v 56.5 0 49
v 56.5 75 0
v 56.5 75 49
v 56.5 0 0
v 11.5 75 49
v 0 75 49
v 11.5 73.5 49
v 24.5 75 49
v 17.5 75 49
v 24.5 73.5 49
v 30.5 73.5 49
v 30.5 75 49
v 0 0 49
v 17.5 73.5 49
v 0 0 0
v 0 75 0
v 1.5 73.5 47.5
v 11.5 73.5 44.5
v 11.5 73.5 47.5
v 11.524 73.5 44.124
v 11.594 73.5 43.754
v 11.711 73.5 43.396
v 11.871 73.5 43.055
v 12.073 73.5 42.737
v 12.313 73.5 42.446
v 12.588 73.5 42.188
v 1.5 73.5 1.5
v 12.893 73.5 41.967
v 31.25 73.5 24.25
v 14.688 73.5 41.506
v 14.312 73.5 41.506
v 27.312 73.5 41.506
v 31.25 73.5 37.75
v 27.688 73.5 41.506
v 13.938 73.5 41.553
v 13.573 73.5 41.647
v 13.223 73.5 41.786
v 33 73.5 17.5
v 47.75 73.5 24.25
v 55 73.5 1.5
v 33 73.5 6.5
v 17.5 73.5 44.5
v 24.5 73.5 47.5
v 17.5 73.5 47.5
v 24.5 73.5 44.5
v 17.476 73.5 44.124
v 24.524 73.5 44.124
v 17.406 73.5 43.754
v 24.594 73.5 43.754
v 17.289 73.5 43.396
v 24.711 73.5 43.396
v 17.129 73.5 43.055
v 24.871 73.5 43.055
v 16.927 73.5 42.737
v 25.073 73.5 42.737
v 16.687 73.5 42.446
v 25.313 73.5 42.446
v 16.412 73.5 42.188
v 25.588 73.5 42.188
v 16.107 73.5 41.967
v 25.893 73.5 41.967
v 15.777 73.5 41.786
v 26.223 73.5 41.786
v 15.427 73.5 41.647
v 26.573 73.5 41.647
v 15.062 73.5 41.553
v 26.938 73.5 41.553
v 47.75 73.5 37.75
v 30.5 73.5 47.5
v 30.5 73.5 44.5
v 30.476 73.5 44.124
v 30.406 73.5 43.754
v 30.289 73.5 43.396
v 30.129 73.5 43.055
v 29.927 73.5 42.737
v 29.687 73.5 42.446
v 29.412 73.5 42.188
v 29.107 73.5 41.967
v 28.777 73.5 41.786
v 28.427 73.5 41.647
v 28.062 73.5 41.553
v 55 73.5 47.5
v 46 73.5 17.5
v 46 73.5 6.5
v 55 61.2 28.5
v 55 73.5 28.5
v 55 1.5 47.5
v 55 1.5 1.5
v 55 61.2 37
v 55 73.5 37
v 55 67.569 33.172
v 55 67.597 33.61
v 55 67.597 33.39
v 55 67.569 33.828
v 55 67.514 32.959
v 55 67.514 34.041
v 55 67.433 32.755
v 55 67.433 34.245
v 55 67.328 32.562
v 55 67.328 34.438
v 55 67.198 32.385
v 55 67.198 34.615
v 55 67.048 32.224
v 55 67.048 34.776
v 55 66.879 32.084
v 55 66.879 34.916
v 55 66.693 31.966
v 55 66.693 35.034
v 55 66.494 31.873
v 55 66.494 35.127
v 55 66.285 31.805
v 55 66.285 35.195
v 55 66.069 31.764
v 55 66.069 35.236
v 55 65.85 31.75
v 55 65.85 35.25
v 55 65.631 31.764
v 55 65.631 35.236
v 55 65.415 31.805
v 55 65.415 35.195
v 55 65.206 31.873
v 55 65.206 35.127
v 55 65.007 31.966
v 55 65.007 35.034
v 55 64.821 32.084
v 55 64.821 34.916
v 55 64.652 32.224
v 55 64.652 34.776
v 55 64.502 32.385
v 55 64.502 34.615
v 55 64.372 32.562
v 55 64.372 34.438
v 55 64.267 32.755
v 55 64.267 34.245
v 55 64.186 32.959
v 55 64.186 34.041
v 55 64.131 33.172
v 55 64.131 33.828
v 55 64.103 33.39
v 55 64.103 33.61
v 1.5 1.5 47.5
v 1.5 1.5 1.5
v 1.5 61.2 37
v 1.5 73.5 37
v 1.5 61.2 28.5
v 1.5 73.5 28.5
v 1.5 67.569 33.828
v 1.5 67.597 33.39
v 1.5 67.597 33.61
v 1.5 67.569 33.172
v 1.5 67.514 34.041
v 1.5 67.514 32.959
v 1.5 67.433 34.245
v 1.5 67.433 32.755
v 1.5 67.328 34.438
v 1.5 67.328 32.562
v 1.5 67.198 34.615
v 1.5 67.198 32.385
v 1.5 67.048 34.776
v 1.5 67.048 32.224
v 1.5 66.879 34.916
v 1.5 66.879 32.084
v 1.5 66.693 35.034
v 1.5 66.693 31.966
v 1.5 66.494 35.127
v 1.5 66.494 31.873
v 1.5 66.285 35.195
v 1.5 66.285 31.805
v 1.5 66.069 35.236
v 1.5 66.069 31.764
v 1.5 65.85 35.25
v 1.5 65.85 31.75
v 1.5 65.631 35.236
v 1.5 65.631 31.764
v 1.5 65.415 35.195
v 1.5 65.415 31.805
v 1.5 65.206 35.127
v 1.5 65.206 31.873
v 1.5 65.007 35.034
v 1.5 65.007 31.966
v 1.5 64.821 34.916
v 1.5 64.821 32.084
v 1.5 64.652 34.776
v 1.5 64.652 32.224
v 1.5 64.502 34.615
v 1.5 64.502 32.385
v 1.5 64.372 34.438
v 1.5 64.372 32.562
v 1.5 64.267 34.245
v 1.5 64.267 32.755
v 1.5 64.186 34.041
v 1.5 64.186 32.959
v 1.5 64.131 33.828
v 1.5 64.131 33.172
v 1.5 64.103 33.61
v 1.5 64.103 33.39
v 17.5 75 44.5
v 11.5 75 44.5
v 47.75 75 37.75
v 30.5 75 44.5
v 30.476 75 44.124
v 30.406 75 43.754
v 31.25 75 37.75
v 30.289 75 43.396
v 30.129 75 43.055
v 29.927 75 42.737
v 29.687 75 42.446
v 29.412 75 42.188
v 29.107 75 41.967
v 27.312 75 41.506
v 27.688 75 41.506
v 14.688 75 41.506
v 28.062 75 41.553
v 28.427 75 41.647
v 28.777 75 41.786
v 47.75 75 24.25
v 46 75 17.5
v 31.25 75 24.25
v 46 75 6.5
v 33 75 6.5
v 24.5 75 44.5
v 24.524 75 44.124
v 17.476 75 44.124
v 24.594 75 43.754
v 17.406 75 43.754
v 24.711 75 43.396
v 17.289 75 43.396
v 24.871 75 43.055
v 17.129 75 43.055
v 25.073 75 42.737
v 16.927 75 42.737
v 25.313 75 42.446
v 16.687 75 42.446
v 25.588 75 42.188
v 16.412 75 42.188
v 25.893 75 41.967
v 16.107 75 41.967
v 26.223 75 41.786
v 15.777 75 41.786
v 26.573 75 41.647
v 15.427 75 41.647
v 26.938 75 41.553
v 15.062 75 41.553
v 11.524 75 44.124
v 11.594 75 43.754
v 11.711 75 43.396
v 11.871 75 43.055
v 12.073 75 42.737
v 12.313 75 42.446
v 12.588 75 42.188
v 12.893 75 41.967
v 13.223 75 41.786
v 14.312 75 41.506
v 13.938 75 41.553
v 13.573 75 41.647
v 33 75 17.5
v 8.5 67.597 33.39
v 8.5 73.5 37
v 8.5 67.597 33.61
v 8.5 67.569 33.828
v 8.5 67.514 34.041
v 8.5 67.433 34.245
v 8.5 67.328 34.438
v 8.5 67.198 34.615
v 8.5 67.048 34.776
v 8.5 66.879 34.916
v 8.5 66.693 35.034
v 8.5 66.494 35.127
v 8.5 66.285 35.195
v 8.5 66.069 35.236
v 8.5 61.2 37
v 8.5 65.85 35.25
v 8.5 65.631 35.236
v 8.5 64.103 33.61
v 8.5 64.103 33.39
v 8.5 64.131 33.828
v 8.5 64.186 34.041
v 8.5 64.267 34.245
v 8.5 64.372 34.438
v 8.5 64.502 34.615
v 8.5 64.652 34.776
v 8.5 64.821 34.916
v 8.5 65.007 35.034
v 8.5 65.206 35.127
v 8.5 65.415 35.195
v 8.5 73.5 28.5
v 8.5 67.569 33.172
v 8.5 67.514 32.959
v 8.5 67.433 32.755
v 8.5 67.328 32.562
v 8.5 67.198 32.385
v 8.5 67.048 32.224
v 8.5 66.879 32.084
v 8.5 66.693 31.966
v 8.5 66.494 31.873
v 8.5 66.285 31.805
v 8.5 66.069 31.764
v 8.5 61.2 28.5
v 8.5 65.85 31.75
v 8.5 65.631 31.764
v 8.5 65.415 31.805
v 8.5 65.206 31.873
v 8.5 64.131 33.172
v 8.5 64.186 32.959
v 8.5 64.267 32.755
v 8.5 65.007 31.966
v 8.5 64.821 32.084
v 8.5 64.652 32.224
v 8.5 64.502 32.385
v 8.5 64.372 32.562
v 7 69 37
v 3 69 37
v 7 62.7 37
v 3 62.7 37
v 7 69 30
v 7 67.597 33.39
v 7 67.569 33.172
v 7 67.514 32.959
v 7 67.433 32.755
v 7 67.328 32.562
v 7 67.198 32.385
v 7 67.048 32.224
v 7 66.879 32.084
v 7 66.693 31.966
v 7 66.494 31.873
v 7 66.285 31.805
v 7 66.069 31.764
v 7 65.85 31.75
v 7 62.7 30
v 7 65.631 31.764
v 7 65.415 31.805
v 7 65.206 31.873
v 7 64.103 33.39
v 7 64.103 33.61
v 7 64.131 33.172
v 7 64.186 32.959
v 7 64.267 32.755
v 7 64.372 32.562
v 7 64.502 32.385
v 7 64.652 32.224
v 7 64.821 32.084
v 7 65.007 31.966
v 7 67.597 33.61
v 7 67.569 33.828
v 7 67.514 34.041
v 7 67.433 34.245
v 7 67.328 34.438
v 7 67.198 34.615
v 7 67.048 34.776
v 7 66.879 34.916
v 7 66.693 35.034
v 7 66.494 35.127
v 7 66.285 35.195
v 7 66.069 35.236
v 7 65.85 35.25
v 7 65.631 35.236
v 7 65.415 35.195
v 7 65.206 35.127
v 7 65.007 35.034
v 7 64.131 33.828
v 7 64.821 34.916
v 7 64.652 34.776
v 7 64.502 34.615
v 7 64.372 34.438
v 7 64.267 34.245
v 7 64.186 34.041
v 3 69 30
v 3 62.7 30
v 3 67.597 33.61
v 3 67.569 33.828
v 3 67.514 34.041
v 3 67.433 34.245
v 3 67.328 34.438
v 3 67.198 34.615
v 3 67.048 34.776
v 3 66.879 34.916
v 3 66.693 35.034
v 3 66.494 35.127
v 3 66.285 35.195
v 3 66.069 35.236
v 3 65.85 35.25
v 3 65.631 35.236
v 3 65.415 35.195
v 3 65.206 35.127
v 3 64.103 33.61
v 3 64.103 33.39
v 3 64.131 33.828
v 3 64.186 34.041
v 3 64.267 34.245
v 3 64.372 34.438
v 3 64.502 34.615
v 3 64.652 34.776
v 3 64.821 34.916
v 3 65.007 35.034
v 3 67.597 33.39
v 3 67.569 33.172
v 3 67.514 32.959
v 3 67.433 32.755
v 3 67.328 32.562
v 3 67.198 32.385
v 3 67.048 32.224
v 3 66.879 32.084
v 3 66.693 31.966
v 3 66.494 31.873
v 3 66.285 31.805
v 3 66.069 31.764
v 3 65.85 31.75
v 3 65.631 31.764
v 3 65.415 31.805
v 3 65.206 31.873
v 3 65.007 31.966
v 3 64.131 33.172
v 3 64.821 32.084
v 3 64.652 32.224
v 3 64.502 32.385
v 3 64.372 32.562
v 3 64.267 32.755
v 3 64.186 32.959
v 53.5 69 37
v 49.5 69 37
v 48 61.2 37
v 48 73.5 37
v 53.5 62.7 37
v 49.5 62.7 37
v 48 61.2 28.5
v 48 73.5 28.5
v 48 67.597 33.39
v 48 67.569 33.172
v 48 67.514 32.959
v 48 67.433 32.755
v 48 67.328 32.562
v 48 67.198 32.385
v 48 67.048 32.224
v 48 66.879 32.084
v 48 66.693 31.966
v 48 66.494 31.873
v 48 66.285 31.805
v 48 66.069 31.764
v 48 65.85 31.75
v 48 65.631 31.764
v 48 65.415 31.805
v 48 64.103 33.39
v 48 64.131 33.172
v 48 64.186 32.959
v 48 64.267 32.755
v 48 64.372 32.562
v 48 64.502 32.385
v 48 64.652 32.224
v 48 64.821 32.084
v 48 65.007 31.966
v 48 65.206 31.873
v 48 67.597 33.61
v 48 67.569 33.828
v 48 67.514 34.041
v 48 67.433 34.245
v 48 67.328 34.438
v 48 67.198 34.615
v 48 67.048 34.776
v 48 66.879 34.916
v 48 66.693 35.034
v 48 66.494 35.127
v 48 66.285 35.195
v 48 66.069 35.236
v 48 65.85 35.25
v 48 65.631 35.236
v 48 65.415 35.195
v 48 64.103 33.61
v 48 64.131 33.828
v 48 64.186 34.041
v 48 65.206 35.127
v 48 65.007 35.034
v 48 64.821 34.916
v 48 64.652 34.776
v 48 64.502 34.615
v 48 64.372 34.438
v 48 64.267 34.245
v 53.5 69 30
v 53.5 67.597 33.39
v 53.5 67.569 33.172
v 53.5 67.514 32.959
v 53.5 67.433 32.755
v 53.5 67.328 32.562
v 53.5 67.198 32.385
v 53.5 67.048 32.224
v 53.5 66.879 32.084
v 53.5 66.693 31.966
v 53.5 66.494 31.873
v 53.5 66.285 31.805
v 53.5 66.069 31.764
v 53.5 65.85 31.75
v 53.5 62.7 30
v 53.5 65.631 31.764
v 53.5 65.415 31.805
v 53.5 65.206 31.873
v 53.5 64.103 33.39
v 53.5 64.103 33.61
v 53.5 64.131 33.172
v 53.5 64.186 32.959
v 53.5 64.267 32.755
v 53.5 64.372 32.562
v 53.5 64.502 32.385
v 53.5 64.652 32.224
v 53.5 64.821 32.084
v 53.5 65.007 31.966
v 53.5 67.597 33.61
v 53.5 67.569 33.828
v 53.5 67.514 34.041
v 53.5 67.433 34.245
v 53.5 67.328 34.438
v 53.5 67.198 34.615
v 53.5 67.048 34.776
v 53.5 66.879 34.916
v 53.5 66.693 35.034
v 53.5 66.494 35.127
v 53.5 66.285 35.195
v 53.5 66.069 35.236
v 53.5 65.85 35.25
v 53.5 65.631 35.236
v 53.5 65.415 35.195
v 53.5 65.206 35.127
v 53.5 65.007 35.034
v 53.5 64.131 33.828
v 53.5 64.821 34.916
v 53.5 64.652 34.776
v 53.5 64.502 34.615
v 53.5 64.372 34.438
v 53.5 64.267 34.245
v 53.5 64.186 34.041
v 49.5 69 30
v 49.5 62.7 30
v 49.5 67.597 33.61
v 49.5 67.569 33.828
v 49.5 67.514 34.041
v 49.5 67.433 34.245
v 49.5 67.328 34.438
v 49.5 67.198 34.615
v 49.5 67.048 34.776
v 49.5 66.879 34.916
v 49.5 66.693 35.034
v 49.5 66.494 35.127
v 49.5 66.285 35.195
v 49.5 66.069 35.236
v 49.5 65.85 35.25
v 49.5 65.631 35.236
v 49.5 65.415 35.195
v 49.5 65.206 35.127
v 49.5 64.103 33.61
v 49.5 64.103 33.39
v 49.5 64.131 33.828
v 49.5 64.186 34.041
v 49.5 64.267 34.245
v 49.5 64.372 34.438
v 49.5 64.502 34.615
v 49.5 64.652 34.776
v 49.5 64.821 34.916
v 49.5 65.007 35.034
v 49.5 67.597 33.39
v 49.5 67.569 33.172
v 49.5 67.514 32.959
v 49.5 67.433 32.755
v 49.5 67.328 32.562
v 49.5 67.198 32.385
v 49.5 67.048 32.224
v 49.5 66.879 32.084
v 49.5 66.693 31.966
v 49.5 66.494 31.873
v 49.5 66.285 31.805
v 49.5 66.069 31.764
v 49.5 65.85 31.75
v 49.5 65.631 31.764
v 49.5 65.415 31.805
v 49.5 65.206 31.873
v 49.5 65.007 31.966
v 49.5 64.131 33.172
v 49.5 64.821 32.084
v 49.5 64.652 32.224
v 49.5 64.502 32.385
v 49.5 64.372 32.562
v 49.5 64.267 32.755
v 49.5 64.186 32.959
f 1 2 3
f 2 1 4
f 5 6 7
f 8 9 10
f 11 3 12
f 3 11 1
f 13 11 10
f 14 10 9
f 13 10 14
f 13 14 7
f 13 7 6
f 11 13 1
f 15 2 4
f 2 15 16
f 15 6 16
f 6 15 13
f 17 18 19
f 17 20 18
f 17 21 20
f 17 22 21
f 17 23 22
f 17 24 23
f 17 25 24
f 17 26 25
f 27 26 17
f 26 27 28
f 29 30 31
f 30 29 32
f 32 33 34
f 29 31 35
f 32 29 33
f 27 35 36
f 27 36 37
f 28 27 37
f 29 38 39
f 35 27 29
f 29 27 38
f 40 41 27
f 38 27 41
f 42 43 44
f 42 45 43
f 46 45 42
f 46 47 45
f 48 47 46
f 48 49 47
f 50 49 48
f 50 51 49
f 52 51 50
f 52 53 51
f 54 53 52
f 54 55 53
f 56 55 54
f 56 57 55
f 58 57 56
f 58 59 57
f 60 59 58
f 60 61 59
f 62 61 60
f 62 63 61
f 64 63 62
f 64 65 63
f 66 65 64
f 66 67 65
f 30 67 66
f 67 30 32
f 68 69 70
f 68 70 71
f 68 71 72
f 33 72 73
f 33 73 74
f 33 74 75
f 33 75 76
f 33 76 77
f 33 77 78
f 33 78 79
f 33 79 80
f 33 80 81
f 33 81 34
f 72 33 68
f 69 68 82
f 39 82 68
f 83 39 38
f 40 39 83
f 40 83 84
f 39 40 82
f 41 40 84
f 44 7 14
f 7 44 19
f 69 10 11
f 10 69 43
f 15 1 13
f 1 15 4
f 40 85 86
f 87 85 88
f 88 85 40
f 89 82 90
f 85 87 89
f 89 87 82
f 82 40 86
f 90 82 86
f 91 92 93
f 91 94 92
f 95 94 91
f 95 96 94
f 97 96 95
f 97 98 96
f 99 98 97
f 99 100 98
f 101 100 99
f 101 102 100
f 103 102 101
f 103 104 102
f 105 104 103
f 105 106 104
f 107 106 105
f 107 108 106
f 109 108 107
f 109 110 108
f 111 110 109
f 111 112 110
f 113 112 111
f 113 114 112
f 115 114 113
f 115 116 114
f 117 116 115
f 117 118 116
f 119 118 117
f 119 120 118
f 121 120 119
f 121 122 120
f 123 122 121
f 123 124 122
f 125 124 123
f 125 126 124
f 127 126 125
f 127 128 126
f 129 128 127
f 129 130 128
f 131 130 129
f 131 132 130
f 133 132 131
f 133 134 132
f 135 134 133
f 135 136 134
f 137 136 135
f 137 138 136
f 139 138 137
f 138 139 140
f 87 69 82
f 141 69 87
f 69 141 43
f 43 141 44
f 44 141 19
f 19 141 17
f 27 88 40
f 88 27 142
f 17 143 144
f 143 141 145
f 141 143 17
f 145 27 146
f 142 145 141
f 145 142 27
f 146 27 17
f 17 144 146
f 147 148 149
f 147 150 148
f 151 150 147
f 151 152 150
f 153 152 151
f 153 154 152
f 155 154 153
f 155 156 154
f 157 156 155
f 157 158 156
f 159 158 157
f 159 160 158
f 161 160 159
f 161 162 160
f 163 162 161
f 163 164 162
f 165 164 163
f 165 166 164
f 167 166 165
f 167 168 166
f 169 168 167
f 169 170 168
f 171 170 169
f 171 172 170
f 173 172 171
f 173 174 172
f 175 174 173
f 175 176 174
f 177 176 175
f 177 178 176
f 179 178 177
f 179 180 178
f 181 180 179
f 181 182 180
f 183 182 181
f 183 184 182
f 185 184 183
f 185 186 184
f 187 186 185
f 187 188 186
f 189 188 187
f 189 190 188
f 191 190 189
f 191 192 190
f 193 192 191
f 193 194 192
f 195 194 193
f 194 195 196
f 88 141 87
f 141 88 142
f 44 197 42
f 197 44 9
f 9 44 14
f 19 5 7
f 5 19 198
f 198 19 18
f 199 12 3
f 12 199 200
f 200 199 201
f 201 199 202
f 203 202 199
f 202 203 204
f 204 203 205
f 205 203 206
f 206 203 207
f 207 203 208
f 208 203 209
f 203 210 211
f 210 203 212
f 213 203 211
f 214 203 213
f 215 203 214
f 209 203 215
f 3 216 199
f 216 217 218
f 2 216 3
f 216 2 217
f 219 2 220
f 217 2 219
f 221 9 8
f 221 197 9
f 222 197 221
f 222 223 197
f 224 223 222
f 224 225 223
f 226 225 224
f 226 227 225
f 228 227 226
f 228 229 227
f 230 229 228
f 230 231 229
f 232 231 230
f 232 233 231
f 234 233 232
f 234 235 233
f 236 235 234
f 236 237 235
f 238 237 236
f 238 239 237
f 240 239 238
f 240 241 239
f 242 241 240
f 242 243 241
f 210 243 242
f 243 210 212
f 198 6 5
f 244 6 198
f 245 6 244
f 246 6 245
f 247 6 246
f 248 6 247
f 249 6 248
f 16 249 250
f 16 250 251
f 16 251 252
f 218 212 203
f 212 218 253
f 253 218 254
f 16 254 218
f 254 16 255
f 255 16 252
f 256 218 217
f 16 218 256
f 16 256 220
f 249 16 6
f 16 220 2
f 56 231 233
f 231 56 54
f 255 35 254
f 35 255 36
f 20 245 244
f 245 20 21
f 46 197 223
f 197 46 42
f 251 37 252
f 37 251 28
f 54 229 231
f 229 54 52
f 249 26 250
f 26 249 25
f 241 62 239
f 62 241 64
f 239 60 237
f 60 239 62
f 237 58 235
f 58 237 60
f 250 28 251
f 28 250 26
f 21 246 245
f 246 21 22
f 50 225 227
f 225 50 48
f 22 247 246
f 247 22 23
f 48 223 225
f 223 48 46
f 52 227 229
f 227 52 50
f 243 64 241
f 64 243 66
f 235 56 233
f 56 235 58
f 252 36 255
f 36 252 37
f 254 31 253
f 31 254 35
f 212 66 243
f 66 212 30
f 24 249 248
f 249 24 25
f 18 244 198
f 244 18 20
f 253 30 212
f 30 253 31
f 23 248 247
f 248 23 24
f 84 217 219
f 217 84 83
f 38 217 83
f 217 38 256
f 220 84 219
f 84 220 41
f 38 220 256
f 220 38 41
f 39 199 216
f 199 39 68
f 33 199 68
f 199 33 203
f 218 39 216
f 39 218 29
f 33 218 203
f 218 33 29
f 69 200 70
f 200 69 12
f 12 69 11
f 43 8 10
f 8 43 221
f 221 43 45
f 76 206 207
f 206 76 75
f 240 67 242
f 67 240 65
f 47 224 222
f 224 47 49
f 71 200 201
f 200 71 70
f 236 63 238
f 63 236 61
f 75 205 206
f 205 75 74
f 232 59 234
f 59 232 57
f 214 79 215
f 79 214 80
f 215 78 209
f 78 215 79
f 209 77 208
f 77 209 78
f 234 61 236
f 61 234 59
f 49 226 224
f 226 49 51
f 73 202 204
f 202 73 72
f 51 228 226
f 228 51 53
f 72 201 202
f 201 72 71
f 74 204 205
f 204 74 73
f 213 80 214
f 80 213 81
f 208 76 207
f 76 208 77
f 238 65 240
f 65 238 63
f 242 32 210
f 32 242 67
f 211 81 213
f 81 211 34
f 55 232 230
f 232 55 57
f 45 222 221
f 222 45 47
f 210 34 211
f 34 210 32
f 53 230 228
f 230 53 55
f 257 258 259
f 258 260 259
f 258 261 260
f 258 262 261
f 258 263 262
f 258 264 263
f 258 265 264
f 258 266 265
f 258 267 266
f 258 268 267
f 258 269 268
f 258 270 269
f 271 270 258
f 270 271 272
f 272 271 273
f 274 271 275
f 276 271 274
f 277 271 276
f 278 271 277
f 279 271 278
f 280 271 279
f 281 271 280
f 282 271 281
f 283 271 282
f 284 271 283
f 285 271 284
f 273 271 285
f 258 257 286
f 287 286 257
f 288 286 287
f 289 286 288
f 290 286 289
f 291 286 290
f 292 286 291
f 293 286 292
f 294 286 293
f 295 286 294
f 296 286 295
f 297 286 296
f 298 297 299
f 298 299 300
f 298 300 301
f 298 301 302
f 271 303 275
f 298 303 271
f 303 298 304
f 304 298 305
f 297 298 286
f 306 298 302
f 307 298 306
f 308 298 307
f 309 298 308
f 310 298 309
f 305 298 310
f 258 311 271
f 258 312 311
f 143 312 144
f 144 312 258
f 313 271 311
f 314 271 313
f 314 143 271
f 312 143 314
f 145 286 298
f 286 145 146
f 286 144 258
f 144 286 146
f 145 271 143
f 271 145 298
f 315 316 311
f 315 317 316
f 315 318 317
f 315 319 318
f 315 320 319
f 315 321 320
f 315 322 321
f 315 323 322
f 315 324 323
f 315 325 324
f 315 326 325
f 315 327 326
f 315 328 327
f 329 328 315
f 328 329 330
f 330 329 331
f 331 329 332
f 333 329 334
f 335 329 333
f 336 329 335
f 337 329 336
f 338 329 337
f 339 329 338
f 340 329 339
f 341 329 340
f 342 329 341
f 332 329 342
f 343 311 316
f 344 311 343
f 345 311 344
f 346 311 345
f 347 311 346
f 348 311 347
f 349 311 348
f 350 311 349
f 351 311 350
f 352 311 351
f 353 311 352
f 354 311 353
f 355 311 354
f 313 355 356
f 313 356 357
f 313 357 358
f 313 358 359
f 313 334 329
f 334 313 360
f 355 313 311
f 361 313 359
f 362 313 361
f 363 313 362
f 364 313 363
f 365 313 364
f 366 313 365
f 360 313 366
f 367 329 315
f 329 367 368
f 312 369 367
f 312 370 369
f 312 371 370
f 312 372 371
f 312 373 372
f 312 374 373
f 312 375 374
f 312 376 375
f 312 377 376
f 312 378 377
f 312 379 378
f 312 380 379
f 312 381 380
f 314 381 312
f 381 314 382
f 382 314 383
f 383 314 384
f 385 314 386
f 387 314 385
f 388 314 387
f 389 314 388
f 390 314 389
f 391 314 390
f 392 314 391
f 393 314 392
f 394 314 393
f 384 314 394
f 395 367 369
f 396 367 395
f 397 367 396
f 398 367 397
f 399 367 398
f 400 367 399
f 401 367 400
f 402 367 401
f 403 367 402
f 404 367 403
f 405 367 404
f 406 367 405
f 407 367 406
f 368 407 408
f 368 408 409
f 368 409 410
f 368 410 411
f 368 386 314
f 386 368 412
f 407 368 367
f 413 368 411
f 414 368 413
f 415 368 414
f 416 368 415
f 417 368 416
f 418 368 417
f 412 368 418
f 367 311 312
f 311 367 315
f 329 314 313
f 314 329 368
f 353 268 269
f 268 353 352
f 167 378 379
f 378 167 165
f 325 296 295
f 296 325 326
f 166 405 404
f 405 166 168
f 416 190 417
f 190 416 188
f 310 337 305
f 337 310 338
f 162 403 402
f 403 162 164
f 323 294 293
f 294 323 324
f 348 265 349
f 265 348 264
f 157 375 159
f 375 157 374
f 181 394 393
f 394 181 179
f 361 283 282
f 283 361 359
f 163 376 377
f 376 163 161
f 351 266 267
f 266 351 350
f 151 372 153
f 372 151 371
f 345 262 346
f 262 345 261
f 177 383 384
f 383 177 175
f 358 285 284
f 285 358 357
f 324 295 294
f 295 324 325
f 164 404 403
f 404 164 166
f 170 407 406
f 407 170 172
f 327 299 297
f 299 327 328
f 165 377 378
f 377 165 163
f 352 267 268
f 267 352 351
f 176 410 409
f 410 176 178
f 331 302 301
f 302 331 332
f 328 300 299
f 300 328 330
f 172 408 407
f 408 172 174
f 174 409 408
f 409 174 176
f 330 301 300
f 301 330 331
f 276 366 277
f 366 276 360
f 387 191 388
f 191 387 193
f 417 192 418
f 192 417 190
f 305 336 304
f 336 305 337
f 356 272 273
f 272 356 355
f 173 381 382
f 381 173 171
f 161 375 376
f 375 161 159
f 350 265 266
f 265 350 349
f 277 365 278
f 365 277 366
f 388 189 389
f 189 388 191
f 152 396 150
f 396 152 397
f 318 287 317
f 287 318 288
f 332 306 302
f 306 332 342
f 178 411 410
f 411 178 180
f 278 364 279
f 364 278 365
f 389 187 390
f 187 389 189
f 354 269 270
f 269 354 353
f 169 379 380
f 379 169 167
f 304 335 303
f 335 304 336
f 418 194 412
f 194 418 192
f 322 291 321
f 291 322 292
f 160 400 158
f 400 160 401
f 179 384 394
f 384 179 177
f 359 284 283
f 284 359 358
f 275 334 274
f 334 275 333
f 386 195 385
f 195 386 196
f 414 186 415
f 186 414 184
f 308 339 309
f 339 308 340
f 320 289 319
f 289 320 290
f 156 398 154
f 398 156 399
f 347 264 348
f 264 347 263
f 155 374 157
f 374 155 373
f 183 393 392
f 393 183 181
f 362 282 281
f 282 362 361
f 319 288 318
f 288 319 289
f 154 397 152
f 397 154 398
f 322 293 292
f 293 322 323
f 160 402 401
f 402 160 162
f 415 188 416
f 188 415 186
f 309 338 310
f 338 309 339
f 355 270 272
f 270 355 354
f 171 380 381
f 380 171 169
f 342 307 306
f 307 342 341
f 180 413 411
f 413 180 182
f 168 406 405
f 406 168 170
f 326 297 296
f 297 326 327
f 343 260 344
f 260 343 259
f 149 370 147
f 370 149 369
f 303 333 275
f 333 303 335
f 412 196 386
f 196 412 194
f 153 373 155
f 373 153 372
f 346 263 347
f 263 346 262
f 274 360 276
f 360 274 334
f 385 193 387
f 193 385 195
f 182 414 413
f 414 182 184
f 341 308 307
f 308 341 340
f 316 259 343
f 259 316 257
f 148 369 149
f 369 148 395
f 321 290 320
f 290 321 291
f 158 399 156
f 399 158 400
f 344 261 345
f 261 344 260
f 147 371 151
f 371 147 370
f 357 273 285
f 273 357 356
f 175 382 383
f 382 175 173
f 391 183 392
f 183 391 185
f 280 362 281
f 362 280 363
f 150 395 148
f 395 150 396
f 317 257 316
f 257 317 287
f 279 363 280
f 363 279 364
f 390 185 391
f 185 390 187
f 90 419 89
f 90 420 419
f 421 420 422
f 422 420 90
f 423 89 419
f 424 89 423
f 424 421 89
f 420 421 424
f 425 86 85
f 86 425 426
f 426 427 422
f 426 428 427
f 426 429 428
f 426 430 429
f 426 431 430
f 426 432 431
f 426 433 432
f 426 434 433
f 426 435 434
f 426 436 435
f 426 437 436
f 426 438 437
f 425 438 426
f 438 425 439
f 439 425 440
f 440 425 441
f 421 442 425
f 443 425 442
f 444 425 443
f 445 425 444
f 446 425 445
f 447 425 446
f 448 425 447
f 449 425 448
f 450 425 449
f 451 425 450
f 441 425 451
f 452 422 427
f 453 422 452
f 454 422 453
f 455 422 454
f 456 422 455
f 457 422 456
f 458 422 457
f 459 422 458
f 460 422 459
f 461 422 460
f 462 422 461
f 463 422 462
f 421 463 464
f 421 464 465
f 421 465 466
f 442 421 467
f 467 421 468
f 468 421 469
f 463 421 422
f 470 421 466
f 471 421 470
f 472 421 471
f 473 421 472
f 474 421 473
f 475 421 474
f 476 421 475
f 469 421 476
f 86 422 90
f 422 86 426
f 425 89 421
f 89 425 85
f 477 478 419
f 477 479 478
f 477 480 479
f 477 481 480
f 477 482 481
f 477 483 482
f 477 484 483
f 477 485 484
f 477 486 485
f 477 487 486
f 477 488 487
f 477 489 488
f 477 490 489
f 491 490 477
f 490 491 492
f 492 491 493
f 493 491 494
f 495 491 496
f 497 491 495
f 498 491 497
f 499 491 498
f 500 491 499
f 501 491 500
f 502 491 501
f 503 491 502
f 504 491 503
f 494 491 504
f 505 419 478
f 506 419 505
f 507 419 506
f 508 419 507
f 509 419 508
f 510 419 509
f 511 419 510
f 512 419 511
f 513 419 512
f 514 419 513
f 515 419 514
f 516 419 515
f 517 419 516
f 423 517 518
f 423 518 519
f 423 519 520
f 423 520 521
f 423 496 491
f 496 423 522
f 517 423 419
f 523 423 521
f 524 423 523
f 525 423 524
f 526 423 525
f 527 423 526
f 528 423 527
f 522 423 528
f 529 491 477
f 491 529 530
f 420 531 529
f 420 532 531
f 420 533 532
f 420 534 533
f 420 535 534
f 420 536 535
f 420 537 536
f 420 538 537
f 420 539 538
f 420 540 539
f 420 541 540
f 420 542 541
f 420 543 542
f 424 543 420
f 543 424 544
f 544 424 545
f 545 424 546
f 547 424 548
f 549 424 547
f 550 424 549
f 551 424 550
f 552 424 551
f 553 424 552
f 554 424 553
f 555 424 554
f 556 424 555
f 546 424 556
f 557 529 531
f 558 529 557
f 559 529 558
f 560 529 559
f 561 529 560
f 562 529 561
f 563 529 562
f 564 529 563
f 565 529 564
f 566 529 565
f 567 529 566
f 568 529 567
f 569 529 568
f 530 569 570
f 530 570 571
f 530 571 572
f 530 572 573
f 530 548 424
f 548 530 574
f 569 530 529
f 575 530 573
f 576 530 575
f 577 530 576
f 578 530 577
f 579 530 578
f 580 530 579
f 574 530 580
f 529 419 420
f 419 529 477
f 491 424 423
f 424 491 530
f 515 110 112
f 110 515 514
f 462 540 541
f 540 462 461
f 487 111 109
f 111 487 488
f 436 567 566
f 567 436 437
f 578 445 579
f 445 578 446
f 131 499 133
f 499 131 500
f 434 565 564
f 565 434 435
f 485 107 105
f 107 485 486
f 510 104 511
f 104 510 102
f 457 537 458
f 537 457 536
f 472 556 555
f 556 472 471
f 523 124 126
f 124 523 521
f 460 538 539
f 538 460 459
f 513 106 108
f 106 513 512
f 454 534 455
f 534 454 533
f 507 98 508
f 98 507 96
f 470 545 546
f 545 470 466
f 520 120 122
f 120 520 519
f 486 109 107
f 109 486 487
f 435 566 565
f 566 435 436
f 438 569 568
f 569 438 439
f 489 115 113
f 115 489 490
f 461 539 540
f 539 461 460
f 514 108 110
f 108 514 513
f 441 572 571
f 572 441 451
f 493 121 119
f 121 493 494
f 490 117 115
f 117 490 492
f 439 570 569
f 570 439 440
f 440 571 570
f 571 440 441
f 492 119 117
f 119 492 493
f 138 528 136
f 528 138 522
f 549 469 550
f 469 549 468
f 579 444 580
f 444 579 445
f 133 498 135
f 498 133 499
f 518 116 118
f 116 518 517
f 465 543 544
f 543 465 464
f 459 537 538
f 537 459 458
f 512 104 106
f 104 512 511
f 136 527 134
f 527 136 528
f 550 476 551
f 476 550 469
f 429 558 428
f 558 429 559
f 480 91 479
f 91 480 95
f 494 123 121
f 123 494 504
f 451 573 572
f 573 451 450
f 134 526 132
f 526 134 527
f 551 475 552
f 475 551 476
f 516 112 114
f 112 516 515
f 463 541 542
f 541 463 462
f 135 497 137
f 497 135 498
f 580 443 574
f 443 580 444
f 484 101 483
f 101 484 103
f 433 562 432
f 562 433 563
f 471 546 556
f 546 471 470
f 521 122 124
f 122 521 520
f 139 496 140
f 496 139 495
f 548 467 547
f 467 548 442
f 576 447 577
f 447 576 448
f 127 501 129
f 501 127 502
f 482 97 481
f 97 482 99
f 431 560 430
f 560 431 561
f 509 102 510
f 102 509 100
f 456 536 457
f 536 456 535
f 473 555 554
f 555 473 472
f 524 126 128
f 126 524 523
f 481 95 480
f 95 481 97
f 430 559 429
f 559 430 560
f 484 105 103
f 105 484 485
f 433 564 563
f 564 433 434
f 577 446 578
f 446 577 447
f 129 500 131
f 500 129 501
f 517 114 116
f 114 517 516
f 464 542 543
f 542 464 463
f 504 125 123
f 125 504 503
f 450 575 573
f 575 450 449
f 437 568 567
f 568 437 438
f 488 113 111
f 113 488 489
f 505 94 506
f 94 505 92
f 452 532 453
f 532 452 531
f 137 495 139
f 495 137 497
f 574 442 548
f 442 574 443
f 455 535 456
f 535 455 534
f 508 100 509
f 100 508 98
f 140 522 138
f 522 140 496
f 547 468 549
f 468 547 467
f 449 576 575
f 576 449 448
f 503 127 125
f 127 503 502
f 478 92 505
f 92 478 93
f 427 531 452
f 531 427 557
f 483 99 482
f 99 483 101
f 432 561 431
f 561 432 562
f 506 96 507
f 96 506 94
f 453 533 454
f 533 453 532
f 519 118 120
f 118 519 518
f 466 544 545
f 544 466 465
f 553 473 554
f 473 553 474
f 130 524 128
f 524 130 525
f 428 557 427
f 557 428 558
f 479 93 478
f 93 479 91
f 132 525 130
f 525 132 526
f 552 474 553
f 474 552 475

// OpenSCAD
$fn = 50;

content_width = 53.5;
content_depth = 72;
content_height = 46;
wall = 1.5;
screw_sep = 3;
screw_bottom = 27;
screw_diam = 3.5;
screw_width = 6.3;
screw_height = 7;
screw_depth = 4;
screw_div = 1;

module box() {
	difference() {
		cube([content_width + wall*2, content_depth + wall, content_height + wall * 2]);
		translate([wall, wall, wall]) {
			cube([content_width, content_depth, content_height]);
		}
	}
}

module end() {
	translate([0, content_depth + wall, 0]) {
		union() {
			difference() {
				cube([content_width + wall * 2, wall, content_height + wall * 2]);
				translate([wall, 0, wall]) {
					// Power hole
					translate([10, 0, content_height - 3])
						cube([6, wall, 3 + wall]);
					translate([13, wall, content_height - 3])
						rotate([90, 0, 0])
							cylinder(h = wall, r = 3);
					// USB hole
					translate([31.5, 0, 5])
						cube([13, wall, 11]);
					// Ethernet hole
					translate([29.75, 0, 22.75])
						cube([16.5, wall, 13.5]);
					// output hole
					translate([23, 0, content_height - 3])
						cube([6, wall, 3 + wall]);
					translate([26, wall, content_height - 3])
						rotate([90, 0, 0])
							cylinder(h = wall, r = 3);
				}
			}
			// Holding part 1
			translate([wall, -(screw_sep + screw_width + wall*2), screw_bottom + wall]) {
				difference() {
					cube([wall*2 + screw_depth, screw_sep + screw_width + wall*2, screw_height + wall]);
					translate([wall, wall, wall])
						cube([screw_depth, screw_width, screw_height]);
					translate([0, screw_width/2 + wall, screw_height/2 + wall])
						rotate([0, 90, 0])
							cylinder(h = wall*2 + screw_depth, r = screw_diam/2);
				}
			}
			// Holding part 2
			translate([content_width - screw_depth - wall, -(screw_sep + screw_width + wall*2), screw_bottom + wall]) {
				difference() {
					cube([wall*2 + screw_depth, screw_sep + screw_width + wall*2, screw_height + wall]);
					translate([wall, wall, wall])
						cube([screw_depth, screw_width, screw_height]);
					translate([0, screw_width/2 + wall, screw_height/2 + wall])
						rotate([0, 90, 0])
							cylinder(h = wall*2 + screw_depth, r = screw_diam/2);
				}
			}
		}
	}
}

box();
end();
